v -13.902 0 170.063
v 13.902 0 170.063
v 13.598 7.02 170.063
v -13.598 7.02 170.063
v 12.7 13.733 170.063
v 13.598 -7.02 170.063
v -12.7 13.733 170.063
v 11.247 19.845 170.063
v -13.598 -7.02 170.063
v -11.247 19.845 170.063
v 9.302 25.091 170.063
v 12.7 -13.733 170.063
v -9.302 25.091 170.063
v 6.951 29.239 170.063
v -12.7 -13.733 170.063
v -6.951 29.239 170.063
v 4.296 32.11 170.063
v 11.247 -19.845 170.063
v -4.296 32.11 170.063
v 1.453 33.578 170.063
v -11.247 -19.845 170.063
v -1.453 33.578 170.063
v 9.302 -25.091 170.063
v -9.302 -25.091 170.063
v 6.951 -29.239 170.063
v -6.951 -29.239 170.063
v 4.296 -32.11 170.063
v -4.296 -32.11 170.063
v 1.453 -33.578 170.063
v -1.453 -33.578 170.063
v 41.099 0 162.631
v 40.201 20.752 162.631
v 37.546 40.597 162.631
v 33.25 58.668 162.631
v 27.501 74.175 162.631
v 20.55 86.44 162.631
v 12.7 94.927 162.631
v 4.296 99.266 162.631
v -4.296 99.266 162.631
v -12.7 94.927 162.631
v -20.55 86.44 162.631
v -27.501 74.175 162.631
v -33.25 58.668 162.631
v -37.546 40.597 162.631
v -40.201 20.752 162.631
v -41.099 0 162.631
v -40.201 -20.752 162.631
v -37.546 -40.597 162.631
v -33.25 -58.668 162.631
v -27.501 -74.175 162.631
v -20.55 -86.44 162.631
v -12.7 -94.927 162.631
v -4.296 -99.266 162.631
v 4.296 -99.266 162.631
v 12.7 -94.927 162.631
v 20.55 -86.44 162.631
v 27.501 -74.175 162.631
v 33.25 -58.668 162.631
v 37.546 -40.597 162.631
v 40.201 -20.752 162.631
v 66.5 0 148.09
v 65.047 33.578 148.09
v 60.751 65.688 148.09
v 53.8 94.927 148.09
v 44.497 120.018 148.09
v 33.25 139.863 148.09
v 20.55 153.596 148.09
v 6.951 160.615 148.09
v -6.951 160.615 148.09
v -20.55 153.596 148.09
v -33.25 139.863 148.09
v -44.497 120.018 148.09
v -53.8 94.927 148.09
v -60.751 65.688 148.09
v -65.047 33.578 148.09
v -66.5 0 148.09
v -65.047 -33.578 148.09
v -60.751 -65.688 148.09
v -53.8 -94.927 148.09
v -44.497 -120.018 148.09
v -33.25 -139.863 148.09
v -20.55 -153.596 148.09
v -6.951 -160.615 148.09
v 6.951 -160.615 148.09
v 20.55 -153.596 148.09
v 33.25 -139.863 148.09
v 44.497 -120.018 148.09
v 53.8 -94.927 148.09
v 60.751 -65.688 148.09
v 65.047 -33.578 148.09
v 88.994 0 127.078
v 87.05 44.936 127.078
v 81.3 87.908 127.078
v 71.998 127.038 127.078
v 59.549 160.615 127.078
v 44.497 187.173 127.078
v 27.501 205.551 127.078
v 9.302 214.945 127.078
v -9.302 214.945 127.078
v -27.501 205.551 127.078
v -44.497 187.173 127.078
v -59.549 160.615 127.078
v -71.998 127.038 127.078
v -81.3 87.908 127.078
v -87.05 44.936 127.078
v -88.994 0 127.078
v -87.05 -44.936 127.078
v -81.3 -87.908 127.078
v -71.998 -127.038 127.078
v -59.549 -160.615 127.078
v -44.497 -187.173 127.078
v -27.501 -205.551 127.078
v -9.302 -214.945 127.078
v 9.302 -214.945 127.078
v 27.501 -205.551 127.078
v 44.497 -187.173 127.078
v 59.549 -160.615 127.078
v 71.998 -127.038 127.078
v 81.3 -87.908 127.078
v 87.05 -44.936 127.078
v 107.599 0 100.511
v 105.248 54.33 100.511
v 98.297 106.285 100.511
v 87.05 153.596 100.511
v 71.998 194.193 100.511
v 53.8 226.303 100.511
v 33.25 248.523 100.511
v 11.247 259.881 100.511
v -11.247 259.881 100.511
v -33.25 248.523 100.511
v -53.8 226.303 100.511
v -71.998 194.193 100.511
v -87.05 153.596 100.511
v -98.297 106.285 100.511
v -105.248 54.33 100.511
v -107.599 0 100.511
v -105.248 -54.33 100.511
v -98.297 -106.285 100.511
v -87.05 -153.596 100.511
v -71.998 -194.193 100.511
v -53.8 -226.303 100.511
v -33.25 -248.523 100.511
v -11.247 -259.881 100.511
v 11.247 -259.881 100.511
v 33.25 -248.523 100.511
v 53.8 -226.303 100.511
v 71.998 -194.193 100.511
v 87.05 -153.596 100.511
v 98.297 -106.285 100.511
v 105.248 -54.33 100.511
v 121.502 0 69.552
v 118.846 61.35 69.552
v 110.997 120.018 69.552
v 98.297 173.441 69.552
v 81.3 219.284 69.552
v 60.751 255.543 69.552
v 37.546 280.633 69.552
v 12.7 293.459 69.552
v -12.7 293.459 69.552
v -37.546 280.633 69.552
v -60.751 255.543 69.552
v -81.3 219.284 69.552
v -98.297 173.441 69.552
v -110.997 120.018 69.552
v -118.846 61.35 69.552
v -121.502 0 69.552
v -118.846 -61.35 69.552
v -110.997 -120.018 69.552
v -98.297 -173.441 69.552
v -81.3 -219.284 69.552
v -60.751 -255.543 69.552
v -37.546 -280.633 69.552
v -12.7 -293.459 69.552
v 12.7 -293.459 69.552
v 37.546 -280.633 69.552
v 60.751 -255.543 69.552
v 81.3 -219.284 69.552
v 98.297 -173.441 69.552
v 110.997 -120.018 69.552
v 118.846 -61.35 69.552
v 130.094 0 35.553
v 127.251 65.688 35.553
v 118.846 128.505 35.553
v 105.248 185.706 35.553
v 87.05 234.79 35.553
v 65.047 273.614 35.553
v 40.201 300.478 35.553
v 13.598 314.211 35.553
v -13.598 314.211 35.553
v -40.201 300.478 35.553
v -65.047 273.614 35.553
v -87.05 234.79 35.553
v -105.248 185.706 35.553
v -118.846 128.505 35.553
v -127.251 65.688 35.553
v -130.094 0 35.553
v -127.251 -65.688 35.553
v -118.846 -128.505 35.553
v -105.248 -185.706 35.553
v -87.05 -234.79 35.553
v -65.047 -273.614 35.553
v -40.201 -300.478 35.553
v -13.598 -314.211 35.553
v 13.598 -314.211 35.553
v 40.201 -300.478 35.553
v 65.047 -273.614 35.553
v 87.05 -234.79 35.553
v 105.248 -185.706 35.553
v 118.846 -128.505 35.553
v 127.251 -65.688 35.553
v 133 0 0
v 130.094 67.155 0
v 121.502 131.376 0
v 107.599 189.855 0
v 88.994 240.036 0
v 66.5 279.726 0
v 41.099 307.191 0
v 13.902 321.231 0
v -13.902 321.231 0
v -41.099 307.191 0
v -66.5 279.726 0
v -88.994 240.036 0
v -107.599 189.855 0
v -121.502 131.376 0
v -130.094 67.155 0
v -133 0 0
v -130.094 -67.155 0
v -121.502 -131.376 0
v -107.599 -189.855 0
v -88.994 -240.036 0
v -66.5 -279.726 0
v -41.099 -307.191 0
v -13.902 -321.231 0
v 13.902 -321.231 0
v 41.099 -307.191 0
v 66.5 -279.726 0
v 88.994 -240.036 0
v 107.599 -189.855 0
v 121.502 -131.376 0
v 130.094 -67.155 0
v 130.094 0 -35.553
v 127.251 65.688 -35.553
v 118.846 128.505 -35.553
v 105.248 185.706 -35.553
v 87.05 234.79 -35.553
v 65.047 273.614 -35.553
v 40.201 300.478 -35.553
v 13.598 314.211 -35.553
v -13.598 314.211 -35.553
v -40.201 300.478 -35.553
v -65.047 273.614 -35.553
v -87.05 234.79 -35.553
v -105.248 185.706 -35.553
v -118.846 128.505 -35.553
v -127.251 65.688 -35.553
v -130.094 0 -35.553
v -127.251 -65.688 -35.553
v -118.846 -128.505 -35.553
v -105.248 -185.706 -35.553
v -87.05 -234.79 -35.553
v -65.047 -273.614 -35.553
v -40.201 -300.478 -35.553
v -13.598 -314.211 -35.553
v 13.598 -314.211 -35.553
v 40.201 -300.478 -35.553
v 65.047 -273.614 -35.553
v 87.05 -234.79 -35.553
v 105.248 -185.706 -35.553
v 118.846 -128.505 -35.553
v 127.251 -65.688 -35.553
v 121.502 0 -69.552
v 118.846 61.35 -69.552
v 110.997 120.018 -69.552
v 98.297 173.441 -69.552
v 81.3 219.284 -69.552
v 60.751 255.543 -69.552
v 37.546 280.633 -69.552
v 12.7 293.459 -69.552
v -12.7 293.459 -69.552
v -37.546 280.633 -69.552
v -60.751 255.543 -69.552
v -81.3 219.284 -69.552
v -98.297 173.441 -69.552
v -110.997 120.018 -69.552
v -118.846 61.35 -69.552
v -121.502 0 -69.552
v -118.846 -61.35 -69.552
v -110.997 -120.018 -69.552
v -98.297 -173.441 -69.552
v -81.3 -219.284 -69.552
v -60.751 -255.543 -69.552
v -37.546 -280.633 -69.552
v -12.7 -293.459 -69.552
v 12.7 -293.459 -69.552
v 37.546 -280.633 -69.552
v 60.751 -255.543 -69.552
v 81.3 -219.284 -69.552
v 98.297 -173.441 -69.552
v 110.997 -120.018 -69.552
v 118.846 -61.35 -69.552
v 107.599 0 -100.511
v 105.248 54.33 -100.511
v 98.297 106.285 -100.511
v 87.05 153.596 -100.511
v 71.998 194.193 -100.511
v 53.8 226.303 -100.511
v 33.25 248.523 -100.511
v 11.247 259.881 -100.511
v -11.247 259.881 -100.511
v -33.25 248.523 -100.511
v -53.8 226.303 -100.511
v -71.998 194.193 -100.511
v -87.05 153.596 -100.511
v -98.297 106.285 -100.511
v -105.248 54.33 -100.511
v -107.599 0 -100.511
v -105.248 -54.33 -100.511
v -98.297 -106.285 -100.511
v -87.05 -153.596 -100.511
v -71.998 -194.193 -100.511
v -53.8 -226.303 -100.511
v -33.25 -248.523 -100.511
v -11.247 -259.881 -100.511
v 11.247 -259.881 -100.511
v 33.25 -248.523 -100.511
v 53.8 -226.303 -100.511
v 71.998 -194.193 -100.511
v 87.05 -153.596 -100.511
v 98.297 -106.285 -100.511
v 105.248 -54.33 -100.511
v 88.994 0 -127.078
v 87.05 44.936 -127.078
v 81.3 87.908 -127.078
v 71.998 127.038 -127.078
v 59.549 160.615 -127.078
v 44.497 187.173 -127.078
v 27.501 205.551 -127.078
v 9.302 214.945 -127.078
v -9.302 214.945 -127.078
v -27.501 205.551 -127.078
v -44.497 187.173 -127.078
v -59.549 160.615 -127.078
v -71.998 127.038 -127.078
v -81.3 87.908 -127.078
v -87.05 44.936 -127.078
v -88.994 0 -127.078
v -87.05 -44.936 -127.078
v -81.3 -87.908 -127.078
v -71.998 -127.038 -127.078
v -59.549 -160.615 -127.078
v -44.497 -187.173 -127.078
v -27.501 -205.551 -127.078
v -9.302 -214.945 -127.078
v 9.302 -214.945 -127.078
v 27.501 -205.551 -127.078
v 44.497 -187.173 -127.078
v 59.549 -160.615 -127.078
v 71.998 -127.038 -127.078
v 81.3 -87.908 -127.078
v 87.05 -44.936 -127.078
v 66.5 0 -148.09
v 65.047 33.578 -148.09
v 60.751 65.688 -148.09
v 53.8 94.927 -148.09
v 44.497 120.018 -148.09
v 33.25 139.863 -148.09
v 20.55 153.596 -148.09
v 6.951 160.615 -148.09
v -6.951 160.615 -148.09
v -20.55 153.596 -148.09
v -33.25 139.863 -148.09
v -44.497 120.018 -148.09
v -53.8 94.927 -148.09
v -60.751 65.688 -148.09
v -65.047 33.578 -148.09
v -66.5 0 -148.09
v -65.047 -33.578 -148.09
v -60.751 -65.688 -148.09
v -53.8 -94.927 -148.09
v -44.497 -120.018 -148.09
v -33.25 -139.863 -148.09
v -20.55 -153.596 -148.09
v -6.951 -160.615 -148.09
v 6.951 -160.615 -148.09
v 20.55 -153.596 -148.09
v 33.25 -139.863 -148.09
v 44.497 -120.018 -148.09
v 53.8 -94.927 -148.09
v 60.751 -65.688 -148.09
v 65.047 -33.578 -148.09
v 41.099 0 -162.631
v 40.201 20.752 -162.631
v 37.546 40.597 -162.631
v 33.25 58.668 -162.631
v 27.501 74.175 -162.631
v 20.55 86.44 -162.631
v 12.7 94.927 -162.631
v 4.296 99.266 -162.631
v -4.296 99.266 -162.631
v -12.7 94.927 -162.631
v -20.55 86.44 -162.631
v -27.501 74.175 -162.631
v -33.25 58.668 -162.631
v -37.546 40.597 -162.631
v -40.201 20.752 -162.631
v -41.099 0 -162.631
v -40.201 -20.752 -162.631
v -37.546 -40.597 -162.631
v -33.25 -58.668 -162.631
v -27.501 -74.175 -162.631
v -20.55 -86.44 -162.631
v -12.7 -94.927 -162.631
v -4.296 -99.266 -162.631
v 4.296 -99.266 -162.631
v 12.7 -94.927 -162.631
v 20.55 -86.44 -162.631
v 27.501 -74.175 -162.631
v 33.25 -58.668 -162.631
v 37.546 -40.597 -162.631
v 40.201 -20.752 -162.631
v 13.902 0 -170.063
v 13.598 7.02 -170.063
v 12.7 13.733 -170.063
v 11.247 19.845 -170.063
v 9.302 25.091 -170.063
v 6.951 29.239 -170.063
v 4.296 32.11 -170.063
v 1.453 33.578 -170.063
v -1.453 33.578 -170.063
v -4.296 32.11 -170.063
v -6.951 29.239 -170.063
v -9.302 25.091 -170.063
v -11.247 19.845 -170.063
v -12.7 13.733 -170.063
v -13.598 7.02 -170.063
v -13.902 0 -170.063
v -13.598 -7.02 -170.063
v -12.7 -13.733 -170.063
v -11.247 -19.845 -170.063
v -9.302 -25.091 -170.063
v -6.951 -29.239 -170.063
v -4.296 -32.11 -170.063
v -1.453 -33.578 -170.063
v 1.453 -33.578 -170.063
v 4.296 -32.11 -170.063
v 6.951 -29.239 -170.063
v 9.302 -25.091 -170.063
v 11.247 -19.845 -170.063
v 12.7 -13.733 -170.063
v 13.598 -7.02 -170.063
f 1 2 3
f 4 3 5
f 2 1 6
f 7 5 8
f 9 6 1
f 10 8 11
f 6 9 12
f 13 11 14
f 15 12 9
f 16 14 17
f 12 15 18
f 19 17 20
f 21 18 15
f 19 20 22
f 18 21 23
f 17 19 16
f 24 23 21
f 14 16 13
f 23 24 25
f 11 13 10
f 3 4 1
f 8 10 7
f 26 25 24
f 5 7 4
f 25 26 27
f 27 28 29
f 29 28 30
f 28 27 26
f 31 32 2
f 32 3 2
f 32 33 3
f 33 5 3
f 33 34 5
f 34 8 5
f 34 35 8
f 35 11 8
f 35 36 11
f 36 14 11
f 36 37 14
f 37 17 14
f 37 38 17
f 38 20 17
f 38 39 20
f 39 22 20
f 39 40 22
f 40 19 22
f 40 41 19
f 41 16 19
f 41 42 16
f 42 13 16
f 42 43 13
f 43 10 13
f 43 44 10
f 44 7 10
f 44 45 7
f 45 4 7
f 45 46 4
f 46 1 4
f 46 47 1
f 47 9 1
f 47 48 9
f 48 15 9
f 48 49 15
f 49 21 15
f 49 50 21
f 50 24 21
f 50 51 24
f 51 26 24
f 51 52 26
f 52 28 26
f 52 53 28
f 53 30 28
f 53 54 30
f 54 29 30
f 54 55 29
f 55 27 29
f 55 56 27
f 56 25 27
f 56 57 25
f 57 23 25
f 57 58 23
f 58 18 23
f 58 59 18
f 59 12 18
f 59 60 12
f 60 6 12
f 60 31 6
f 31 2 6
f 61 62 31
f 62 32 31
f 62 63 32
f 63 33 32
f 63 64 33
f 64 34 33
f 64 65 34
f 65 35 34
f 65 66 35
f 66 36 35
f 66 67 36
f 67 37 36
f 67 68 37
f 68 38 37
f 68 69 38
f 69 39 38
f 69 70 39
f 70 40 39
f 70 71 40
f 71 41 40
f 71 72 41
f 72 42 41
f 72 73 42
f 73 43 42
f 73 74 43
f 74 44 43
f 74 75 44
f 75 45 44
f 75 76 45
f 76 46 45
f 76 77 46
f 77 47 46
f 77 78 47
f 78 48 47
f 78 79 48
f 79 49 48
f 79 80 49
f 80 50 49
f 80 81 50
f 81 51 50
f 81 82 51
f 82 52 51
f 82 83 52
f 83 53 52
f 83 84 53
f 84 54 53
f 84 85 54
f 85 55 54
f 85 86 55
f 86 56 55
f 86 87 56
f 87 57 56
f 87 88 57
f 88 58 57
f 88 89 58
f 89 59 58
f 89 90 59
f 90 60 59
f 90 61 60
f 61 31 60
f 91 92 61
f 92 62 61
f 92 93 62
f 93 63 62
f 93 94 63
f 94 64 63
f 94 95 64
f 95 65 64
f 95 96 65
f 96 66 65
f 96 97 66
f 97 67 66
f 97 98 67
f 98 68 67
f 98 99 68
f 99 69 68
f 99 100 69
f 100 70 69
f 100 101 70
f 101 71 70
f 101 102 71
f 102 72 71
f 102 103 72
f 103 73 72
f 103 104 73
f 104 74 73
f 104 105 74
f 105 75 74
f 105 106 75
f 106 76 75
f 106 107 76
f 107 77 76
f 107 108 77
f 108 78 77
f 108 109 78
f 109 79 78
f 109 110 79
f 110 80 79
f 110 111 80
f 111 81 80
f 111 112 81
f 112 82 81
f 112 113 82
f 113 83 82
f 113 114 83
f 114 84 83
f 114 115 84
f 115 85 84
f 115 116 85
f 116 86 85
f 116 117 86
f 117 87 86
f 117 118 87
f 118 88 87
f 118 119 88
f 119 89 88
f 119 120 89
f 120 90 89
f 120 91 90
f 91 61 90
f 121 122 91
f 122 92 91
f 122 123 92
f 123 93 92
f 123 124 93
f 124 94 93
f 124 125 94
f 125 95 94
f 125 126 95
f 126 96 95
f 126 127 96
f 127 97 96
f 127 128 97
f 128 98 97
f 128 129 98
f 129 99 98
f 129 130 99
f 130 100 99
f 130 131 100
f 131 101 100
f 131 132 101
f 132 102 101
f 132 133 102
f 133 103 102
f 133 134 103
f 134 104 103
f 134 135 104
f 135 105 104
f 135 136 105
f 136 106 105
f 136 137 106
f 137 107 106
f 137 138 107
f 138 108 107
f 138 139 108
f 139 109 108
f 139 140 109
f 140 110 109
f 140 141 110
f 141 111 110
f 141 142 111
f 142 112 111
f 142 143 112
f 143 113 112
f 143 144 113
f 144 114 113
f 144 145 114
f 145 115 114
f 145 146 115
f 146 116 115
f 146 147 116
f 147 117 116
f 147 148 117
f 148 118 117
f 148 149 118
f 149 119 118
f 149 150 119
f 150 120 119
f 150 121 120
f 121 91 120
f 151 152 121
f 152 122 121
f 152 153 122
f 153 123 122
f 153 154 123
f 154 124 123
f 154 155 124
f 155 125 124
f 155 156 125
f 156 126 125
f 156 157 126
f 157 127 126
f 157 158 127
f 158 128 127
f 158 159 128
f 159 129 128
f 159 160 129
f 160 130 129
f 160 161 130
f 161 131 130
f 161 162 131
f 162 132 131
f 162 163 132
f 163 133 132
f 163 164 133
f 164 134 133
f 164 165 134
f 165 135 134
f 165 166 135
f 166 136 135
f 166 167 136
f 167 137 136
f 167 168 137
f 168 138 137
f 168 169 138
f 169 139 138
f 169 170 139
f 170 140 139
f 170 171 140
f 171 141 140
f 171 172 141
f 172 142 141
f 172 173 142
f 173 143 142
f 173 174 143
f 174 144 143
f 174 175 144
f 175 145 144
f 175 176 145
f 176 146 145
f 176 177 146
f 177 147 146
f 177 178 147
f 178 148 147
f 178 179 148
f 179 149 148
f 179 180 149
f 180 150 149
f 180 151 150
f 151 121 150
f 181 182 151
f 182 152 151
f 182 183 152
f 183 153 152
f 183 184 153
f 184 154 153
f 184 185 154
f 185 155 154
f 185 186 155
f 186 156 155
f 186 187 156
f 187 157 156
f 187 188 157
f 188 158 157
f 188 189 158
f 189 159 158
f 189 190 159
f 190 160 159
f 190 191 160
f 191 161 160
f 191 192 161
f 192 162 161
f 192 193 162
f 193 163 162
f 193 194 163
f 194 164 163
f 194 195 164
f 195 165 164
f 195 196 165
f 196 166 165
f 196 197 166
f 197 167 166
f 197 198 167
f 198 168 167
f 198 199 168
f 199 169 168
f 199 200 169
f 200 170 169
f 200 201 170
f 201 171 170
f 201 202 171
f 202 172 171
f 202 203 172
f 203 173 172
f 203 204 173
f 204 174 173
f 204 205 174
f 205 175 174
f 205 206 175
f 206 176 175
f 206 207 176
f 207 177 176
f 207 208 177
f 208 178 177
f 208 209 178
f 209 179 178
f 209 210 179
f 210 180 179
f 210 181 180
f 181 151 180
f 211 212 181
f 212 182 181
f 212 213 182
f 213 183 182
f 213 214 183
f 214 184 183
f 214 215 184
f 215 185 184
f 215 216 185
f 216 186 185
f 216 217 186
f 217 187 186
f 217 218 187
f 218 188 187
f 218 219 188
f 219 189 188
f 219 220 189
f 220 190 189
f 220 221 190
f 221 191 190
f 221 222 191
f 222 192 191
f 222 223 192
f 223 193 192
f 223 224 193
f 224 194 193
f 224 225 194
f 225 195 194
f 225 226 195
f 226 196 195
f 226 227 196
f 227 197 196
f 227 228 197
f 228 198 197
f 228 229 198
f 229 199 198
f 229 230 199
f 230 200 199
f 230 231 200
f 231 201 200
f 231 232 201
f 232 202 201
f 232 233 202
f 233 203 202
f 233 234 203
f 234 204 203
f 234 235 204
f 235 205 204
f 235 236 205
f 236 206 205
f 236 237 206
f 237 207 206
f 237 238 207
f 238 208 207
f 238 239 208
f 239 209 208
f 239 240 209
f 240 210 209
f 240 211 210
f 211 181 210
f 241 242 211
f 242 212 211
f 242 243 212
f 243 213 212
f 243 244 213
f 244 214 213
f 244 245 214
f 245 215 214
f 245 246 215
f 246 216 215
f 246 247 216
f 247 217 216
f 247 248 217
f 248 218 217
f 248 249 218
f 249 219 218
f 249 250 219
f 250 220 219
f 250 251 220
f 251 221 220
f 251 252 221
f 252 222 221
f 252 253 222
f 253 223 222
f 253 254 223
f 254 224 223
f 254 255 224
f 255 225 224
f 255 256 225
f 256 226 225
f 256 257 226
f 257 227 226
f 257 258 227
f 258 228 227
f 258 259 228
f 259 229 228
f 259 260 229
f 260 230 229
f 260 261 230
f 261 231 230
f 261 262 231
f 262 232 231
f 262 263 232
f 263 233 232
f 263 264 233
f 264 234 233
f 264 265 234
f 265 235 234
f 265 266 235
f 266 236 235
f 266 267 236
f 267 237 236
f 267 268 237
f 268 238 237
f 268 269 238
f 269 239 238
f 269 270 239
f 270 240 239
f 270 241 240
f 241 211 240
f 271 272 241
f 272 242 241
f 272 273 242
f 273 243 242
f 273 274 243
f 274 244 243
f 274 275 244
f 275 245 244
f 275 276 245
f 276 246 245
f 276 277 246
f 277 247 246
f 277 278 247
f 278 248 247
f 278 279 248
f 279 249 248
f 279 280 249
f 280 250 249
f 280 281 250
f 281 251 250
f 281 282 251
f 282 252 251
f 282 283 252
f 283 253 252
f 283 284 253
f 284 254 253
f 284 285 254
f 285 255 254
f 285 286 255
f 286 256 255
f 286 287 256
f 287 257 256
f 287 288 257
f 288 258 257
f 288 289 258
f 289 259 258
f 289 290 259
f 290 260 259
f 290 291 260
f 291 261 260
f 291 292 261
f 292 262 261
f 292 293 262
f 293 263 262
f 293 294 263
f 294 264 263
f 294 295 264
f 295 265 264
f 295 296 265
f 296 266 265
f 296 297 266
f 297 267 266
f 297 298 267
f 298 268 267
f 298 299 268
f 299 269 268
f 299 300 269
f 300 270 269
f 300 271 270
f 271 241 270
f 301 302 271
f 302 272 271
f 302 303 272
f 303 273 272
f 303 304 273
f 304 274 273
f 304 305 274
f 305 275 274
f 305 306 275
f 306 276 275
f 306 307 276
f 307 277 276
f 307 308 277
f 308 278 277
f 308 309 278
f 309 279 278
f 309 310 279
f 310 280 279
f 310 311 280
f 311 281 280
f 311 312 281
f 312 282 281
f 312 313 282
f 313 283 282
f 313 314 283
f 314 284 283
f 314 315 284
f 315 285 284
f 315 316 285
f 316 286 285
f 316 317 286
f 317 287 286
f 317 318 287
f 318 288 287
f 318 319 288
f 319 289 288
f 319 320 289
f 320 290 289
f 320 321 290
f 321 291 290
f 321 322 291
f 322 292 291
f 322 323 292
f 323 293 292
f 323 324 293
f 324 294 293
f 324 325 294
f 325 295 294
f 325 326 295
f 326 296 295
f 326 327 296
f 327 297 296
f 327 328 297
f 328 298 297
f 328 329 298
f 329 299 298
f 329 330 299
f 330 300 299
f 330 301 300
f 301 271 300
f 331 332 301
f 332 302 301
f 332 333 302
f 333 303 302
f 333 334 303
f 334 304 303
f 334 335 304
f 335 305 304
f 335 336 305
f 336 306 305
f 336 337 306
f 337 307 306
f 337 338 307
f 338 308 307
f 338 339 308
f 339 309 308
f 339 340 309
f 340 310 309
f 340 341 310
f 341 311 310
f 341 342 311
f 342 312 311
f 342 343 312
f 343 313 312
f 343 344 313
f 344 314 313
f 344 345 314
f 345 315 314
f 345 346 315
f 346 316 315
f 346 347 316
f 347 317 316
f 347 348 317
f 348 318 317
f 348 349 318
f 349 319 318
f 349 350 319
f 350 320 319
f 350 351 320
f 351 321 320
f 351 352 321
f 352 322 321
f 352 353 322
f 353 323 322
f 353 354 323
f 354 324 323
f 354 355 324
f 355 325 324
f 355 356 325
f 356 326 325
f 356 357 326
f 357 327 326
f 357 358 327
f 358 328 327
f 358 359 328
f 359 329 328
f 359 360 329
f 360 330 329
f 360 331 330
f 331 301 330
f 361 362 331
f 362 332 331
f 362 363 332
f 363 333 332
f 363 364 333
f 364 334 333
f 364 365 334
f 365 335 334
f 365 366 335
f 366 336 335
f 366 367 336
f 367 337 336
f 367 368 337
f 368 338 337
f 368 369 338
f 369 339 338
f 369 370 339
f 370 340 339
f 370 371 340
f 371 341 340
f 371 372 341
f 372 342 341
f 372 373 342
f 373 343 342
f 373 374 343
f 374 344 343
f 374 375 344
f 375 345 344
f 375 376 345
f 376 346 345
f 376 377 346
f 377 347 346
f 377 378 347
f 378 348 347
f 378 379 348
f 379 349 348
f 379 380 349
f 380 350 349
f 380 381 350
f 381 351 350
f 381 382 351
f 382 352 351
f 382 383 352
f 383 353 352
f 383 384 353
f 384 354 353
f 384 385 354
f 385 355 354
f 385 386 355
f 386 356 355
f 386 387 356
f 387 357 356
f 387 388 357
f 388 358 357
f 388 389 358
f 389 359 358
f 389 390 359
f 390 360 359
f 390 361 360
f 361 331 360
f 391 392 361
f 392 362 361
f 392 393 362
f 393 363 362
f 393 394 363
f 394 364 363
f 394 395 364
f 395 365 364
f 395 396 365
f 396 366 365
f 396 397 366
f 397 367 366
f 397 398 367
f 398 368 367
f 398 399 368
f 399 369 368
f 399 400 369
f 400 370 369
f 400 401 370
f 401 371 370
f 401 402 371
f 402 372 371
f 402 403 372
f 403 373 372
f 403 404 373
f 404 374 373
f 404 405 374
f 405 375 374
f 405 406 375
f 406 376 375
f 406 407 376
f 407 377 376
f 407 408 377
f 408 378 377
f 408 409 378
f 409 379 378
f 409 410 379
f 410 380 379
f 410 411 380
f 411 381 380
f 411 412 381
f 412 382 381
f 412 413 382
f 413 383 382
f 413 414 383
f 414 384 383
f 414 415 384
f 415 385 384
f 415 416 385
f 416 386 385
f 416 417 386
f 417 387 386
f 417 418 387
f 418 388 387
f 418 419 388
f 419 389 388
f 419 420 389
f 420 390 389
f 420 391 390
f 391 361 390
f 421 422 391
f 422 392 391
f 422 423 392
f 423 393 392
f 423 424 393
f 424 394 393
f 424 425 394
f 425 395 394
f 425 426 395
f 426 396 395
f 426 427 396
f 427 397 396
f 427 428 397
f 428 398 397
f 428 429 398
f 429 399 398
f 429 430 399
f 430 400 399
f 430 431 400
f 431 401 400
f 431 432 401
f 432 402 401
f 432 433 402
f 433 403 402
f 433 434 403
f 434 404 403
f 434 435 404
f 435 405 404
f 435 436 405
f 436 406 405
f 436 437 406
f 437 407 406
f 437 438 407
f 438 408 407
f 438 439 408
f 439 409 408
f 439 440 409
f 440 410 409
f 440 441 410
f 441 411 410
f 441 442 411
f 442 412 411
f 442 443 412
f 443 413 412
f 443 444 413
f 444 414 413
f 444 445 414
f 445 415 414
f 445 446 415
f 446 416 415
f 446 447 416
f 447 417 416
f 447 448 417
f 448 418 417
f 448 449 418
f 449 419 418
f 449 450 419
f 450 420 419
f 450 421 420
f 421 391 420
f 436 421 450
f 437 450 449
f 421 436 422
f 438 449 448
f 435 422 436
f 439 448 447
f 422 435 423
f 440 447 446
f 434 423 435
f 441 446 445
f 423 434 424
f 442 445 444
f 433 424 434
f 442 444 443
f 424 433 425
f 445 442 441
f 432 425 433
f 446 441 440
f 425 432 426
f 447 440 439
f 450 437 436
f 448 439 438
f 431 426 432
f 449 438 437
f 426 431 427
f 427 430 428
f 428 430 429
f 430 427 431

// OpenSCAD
// Generated by SolidPython 1.0.1 on 2020-07-29 00:46:48


scale(v = [7, 17, 9]) {
	sphere(r = 19);
}
/***********************************************
*********      SolidPython code:      **********
************************************************
 
# import packages: SolidPython
from solid import *
from solid.utils import *
from itertools import chain, combinations, permutations


class Resize:

    def __init__(self, scad_file):
        self.scad_file = scad_file
        #self.scad_file = import_scad(scad_file)
        # cone/cylinder param:
        self.r1 = 0
        self.r2 = 0
        self.h = 0
        # rectangular prism param:
        self.w = 0
        self.l = 0
        # ellipse param:
        self.r = 0

    # import OpenScad code (file name corresponds to shape)


    # classify shape + parameters
    def assign(self, param1, param2, param3):
        if self.scad_file == 'cone.scad':
            self.r1 = param1
            self.r2 = param2
            self.h = param3
        elif self.scad_file == 'cylinder.scad':
            self.r1 = param1
            self.r2 = param2
            self.h = param3
        elif self.scad_file == 'rectangularPrism.scad':
            self.h = param1
            self.l = param2
            self.w = param3
        else:
            self.r = param1
            self.h = param2

    # resize parameters
    def iterate(self):
        x = range(3, 20, 2)
        i = 1
        if self.scad_file == 'cone.scad':
            tempList = list(permutations(x, 2))
            for temp in tempList:
                param1 = temp[0]
                param2 = temp[1]
                filepath = 'produced_scad_files/' + 'cone' + str(param1) + '_' + str(param2) + '_' + '.scad'
                scad_render_to_file(cylinder(h=param1, r1=param2, r2=0), filepath)

        elif self.scad_file == 'cylinder.scad':
            tempList = list(permutations(x, 3))
            for temp in tempList:
                param1 = temp[0]
                param2 = temp[1]
                filepath = 'produced_scad_files/' + 'cylinder' + str(param1) + '_' + str(param2) + '_' + '.scad'
                scad_render_to_file(cylinder(h=param1, r1=param2, r2=param2), filepath)

        elif self.scad_file == 'rectangularPrism.scad':
            tempList = list(permutations(x, 3))
            for temp in tempList:
                param1 = temp[0]
                param2 = temp[1]
                param3 = temp[2]
                filepath = 'produced_scad_files/' + 'rectangularPrism' + str(param1) + '_' + str(param2) + '_' + str(
                    param3) + '.scad'
                scad_render_to_file(cube(size=(param1, param2, param3)), filepath)

        elif self.scad_file == 'ellipse.scad':
            tempList = list(permutations(x, 4))
            for temp in tempList:
                param1 = temp[0]
                param2 = temp[1]
                param3 = temp[2]
                param4 = temp[3]
                filepath = 'produced_scad_files/' + 'ellipse' + str(param1) + '_' + str(param2) + '_' + str(param3) + '_' + str(param4) + '.scad'
                scad_render_to_file(scale([param1, param2, param3])(sphere(r=param4)), filepath)

    def render_to_scadfile(self):
        scad_render_to_file(scad, 'example.scad') 
 
************************************************/
